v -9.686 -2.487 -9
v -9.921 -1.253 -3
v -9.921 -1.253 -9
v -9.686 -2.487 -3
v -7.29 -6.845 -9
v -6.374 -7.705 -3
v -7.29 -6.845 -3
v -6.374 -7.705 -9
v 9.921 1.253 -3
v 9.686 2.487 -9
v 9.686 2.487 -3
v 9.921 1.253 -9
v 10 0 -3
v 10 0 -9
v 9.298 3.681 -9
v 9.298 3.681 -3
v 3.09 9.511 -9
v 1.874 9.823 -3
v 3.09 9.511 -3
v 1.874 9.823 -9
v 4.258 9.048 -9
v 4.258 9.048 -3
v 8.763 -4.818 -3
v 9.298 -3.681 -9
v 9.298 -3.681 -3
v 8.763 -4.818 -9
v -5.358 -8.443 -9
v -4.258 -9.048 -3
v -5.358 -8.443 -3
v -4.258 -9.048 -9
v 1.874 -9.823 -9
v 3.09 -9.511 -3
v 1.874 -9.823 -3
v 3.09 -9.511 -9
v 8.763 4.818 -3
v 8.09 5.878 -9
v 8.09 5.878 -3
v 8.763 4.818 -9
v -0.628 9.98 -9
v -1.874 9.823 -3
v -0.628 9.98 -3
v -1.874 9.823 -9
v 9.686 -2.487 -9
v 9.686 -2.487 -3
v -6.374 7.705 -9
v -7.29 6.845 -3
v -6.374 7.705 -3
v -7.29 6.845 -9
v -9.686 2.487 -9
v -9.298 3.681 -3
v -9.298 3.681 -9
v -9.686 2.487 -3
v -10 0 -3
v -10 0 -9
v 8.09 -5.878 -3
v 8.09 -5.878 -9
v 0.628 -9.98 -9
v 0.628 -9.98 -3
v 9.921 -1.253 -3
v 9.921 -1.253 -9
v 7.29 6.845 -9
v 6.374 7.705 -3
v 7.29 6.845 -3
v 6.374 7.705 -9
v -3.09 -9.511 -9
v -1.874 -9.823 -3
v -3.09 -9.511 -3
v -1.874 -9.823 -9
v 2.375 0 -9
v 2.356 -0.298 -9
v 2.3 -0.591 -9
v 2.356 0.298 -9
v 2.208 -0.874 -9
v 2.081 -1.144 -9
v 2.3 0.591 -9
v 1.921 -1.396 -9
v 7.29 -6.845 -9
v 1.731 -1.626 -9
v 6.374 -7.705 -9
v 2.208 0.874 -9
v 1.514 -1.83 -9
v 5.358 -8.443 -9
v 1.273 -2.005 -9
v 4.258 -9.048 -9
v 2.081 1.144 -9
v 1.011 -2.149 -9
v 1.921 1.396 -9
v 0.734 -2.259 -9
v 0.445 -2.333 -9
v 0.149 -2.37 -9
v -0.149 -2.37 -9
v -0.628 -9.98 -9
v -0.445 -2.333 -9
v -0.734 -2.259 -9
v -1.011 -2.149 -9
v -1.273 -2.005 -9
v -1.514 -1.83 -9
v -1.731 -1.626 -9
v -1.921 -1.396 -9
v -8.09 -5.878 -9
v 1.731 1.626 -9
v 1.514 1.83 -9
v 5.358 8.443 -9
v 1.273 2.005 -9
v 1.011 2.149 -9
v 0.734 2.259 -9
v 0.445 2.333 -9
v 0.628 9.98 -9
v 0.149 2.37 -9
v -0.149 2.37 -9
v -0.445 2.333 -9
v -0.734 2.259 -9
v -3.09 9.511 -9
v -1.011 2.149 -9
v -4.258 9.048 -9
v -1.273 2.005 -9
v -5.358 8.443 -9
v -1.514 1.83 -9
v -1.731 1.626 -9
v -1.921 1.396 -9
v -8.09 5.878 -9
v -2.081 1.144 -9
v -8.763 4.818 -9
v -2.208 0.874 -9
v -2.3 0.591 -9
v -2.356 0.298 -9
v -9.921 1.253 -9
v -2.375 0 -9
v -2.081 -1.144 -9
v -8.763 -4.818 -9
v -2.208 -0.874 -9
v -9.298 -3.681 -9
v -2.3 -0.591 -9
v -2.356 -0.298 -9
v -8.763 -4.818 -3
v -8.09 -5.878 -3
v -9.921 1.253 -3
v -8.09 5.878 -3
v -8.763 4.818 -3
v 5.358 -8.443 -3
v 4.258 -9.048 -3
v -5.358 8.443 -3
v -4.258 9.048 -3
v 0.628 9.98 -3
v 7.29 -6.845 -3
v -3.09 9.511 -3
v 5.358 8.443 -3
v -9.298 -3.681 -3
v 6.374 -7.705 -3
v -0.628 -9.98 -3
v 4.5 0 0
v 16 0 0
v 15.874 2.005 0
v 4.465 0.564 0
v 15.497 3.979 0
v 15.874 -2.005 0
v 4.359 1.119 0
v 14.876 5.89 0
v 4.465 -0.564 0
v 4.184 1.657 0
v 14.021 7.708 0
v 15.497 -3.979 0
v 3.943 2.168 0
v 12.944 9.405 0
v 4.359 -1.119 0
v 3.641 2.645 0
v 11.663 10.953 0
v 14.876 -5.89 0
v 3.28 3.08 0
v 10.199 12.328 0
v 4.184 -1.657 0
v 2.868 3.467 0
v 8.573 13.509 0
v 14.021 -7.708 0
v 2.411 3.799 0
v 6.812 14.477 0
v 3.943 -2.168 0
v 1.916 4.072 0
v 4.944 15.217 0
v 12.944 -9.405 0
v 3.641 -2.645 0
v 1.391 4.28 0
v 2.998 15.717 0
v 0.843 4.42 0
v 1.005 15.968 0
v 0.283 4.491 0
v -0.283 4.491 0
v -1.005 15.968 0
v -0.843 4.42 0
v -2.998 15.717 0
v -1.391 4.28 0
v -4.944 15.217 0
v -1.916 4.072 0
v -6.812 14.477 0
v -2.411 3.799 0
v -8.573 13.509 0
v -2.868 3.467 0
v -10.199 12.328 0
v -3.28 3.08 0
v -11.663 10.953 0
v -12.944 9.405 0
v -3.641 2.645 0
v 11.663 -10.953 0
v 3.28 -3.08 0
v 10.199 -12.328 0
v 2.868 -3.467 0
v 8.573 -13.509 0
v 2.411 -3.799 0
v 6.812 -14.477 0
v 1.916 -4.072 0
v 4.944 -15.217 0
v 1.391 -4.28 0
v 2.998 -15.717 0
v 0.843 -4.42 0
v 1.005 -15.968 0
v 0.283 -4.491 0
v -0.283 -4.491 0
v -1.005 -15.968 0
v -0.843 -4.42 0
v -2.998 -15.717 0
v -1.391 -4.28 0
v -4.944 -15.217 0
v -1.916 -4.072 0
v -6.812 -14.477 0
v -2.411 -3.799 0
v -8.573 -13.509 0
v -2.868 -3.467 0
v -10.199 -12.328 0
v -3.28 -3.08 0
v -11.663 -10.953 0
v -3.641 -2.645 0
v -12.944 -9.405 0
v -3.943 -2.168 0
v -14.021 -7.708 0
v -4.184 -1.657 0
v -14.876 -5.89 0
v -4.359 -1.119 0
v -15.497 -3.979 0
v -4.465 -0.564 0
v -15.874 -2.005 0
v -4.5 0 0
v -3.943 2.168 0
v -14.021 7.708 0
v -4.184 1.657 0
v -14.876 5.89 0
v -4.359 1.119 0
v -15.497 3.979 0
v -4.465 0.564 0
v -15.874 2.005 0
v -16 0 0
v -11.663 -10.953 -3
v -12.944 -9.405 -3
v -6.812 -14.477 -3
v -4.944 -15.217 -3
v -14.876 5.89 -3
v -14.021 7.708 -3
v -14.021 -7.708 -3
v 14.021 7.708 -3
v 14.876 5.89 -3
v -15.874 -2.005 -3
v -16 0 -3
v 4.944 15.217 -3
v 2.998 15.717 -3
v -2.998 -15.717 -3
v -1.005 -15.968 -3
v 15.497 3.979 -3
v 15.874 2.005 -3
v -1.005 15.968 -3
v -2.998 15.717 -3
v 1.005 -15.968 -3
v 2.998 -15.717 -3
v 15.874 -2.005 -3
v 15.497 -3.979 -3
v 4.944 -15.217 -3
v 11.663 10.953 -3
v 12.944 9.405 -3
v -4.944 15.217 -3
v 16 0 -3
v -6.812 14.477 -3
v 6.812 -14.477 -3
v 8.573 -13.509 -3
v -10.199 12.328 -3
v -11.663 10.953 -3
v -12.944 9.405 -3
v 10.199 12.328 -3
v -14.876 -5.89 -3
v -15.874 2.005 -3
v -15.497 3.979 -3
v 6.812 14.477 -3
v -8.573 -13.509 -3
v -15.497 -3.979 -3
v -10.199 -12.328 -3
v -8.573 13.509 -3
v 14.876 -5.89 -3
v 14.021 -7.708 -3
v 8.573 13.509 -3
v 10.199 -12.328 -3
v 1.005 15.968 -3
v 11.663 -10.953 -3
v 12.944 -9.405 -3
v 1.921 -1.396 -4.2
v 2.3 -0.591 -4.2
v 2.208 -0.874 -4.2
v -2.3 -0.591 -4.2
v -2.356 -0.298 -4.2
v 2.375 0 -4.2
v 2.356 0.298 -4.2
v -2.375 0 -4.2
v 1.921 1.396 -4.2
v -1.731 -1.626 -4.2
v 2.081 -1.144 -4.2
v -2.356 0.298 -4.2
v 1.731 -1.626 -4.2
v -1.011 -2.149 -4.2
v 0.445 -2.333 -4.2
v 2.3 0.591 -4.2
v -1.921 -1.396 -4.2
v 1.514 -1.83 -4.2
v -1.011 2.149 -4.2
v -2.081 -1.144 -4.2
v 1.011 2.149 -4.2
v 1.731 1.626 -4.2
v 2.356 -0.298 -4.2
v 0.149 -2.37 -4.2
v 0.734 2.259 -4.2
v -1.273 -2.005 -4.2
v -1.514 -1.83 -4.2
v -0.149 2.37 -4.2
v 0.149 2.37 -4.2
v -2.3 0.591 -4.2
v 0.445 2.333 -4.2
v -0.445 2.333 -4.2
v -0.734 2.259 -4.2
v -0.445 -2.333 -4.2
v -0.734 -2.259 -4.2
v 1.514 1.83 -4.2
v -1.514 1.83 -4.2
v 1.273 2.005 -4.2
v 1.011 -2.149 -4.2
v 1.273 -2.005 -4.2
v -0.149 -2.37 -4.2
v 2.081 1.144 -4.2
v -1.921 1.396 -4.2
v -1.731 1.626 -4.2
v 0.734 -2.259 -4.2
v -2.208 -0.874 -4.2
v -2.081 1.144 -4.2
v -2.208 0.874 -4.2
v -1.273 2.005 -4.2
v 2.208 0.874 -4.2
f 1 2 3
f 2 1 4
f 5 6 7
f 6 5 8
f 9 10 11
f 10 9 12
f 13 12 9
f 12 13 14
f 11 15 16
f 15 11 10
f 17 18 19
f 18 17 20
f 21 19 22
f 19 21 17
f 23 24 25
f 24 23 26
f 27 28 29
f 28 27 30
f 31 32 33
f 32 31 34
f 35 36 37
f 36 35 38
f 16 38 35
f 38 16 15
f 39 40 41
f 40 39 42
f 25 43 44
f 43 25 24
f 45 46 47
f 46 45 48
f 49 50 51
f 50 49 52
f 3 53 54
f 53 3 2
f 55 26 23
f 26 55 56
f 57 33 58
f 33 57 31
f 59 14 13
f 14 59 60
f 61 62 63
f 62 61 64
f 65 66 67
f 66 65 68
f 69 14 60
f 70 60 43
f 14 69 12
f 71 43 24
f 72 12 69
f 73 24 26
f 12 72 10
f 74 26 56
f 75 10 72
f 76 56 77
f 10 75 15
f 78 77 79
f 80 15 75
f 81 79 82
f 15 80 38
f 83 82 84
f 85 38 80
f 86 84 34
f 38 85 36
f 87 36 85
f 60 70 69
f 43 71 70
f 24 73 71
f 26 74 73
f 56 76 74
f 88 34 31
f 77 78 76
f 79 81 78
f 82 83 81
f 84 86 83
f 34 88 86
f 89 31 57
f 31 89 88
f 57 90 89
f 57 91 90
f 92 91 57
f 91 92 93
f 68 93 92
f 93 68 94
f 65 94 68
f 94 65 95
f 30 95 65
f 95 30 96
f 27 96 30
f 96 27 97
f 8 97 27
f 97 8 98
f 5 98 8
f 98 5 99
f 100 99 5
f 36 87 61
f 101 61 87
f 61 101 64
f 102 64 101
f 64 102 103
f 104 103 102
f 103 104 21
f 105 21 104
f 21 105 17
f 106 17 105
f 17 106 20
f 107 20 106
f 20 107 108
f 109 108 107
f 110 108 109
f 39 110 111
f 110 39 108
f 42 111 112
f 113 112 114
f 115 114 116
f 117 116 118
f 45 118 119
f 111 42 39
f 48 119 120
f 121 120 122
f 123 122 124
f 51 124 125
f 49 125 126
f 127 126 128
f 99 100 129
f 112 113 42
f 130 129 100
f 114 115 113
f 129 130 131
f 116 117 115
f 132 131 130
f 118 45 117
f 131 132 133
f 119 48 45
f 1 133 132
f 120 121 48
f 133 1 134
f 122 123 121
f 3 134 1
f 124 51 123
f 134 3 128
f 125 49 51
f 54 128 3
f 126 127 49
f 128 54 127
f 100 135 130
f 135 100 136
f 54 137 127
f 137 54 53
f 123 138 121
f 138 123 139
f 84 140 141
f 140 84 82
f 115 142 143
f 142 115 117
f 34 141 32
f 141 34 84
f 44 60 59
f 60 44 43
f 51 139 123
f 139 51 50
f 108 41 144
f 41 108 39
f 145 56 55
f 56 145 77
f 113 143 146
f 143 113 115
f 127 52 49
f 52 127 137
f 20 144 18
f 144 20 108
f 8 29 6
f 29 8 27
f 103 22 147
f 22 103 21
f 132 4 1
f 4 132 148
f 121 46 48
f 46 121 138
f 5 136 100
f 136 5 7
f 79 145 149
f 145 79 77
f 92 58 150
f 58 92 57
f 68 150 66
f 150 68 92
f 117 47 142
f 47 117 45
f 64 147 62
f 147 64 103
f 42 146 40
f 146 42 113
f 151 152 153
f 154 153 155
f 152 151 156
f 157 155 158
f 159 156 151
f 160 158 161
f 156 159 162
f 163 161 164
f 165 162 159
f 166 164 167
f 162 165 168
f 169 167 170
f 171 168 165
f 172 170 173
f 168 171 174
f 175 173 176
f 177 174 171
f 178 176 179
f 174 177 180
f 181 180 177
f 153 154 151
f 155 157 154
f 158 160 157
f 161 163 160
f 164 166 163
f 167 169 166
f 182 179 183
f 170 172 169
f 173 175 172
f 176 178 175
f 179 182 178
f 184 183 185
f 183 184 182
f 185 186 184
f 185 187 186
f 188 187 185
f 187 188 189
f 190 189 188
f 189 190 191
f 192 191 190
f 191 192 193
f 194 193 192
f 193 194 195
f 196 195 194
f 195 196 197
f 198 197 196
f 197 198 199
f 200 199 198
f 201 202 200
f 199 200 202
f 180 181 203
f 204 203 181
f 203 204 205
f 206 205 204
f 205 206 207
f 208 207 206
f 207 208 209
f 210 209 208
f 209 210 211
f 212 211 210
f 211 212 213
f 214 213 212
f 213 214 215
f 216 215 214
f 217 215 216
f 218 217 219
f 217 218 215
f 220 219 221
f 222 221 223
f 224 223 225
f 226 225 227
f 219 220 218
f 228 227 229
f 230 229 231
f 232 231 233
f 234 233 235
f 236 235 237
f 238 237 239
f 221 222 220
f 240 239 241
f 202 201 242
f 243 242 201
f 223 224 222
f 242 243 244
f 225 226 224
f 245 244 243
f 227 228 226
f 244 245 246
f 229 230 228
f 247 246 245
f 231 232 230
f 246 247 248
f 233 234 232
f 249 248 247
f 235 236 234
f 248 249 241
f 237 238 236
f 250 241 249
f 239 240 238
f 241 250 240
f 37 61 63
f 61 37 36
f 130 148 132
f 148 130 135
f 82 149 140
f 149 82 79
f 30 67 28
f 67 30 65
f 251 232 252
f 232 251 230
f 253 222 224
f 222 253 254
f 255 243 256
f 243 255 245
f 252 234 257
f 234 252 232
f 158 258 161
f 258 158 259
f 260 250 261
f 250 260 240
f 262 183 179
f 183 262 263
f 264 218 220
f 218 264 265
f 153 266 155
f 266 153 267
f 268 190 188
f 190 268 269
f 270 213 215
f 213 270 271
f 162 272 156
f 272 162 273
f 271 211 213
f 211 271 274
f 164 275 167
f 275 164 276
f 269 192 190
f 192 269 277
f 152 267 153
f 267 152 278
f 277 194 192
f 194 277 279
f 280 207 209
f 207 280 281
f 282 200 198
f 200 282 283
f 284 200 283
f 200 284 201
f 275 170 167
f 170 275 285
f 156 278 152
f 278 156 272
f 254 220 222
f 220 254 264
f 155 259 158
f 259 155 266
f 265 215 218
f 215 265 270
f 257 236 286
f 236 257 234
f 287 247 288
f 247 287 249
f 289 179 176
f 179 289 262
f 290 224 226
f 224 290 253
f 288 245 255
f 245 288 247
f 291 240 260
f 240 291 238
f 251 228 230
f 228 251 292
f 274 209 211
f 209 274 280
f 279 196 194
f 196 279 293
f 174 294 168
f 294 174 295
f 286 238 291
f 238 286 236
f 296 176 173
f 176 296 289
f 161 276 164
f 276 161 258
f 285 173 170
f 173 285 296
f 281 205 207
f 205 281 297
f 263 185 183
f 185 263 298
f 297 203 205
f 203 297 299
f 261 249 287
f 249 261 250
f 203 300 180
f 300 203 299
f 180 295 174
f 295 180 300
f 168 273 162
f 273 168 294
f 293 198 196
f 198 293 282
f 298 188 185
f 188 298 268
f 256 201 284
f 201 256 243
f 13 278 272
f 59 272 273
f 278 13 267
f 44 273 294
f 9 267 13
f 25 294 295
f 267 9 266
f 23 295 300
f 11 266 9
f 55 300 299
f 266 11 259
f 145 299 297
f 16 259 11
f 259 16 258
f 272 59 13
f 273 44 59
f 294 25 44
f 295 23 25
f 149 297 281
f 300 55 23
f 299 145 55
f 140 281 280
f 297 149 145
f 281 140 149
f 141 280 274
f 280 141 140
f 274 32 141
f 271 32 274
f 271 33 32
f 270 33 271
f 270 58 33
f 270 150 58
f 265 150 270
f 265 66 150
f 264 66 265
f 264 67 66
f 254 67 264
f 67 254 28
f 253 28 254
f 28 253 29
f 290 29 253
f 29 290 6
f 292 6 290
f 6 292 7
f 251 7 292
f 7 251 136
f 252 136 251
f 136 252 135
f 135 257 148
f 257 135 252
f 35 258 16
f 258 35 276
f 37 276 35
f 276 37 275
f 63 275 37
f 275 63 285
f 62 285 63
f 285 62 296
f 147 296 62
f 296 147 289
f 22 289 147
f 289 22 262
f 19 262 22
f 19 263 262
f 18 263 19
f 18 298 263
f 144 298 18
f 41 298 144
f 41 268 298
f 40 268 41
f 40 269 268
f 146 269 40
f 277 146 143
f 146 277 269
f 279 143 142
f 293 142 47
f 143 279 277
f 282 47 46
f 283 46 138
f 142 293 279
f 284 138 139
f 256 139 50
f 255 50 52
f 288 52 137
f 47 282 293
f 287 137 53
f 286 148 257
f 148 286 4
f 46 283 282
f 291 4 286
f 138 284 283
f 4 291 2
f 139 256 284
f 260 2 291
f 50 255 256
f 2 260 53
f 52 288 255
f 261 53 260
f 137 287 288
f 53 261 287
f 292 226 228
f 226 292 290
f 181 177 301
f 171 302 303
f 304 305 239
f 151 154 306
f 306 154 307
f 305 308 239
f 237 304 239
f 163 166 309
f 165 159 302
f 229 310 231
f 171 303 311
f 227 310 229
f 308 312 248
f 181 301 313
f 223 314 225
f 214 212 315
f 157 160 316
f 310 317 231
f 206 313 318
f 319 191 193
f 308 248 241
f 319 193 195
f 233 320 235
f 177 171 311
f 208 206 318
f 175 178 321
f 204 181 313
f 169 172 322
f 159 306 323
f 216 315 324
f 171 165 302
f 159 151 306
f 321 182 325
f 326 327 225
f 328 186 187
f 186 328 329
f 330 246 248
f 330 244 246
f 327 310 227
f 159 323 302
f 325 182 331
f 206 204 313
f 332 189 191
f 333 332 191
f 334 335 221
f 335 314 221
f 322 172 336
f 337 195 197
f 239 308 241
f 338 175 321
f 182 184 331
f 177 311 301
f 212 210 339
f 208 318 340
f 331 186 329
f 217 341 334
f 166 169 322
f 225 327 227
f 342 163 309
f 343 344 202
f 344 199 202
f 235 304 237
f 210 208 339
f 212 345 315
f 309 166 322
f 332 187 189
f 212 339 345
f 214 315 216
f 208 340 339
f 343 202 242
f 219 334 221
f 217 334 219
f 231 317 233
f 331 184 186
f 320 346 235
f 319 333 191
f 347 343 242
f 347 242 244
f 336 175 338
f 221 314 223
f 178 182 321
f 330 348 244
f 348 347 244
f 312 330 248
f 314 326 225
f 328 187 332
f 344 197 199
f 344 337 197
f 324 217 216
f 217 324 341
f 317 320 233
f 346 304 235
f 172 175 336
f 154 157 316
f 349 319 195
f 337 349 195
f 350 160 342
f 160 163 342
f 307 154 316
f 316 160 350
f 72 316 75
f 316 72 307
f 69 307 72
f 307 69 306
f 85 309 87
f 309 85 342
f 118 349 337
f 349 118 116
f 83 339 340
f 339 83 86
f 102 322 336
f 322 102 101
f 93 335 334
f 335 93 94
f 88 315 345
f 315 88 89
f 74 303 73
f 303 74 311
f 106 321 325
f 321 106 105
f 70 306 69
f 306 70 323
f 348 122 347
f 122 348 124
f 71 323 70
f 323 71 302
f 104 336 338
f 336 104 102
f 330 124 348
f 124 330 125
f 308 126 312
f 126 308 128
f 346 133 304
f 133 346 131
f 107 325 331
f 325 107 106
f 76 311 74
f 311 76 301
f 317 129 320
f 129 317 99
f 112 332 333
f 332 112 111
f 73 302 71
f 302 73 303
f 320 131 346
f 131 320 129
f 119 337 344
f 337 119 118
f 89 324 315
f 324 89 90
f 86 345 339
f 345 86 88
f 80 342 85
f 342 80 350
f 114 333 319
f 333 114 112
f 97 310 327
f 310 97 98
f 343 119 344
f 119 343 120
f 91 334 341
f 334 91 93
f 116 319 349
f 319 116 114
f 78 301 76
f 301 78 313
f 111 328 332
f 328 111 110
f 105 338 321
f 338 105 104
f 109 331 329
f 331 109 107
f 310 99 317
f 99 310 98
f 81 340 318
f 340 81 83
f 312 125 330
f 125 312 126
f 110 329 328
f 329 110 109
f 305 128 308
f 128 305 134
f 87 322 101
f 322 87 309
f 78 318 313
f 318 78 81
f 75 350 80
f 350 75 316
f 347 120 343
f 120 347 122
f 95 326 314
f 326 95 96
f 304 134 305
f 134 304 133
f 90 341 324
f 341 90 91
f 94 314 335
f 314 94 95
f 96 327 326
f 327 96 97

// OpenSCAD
$fn = 50;


difference() {
	union() {
		translate(v = [0, 0, -9.0000000000]) {
			cylinder(h = 9, r = 10.0000000000);
		}
		translate(v = [0, 0, -3.0000000000]) {
			cylinder(h = 3, r = 16.0000000000);
		}
	}
	union() {
		translate(v = [0, 0, 0]) {
			rotate(a = [0, 0, 0]) {
				difference() {
					union() {
						#translate(v = [0, 0, -9.0000000000]) {
							cylinder(h = 9, r = 2.2500000000);
						}
						#translate(v = [0, 0, -4.2000000000]) {
							cylinder(h = 4.2000000000, r1 = 2.3750000000, r2 = 4.5000000000);
						}
						#translate(v = [0, 0, -9.0000000000]) {
							cylinder(h = 9, r = 2.3750000000);
						}
						#translate(v = [0, 0, -9.0000000000]) {
							cylinder(h = 9, r = 2.2500000000);
						}
					}
					union();
				}
			}
		}
	}
}
